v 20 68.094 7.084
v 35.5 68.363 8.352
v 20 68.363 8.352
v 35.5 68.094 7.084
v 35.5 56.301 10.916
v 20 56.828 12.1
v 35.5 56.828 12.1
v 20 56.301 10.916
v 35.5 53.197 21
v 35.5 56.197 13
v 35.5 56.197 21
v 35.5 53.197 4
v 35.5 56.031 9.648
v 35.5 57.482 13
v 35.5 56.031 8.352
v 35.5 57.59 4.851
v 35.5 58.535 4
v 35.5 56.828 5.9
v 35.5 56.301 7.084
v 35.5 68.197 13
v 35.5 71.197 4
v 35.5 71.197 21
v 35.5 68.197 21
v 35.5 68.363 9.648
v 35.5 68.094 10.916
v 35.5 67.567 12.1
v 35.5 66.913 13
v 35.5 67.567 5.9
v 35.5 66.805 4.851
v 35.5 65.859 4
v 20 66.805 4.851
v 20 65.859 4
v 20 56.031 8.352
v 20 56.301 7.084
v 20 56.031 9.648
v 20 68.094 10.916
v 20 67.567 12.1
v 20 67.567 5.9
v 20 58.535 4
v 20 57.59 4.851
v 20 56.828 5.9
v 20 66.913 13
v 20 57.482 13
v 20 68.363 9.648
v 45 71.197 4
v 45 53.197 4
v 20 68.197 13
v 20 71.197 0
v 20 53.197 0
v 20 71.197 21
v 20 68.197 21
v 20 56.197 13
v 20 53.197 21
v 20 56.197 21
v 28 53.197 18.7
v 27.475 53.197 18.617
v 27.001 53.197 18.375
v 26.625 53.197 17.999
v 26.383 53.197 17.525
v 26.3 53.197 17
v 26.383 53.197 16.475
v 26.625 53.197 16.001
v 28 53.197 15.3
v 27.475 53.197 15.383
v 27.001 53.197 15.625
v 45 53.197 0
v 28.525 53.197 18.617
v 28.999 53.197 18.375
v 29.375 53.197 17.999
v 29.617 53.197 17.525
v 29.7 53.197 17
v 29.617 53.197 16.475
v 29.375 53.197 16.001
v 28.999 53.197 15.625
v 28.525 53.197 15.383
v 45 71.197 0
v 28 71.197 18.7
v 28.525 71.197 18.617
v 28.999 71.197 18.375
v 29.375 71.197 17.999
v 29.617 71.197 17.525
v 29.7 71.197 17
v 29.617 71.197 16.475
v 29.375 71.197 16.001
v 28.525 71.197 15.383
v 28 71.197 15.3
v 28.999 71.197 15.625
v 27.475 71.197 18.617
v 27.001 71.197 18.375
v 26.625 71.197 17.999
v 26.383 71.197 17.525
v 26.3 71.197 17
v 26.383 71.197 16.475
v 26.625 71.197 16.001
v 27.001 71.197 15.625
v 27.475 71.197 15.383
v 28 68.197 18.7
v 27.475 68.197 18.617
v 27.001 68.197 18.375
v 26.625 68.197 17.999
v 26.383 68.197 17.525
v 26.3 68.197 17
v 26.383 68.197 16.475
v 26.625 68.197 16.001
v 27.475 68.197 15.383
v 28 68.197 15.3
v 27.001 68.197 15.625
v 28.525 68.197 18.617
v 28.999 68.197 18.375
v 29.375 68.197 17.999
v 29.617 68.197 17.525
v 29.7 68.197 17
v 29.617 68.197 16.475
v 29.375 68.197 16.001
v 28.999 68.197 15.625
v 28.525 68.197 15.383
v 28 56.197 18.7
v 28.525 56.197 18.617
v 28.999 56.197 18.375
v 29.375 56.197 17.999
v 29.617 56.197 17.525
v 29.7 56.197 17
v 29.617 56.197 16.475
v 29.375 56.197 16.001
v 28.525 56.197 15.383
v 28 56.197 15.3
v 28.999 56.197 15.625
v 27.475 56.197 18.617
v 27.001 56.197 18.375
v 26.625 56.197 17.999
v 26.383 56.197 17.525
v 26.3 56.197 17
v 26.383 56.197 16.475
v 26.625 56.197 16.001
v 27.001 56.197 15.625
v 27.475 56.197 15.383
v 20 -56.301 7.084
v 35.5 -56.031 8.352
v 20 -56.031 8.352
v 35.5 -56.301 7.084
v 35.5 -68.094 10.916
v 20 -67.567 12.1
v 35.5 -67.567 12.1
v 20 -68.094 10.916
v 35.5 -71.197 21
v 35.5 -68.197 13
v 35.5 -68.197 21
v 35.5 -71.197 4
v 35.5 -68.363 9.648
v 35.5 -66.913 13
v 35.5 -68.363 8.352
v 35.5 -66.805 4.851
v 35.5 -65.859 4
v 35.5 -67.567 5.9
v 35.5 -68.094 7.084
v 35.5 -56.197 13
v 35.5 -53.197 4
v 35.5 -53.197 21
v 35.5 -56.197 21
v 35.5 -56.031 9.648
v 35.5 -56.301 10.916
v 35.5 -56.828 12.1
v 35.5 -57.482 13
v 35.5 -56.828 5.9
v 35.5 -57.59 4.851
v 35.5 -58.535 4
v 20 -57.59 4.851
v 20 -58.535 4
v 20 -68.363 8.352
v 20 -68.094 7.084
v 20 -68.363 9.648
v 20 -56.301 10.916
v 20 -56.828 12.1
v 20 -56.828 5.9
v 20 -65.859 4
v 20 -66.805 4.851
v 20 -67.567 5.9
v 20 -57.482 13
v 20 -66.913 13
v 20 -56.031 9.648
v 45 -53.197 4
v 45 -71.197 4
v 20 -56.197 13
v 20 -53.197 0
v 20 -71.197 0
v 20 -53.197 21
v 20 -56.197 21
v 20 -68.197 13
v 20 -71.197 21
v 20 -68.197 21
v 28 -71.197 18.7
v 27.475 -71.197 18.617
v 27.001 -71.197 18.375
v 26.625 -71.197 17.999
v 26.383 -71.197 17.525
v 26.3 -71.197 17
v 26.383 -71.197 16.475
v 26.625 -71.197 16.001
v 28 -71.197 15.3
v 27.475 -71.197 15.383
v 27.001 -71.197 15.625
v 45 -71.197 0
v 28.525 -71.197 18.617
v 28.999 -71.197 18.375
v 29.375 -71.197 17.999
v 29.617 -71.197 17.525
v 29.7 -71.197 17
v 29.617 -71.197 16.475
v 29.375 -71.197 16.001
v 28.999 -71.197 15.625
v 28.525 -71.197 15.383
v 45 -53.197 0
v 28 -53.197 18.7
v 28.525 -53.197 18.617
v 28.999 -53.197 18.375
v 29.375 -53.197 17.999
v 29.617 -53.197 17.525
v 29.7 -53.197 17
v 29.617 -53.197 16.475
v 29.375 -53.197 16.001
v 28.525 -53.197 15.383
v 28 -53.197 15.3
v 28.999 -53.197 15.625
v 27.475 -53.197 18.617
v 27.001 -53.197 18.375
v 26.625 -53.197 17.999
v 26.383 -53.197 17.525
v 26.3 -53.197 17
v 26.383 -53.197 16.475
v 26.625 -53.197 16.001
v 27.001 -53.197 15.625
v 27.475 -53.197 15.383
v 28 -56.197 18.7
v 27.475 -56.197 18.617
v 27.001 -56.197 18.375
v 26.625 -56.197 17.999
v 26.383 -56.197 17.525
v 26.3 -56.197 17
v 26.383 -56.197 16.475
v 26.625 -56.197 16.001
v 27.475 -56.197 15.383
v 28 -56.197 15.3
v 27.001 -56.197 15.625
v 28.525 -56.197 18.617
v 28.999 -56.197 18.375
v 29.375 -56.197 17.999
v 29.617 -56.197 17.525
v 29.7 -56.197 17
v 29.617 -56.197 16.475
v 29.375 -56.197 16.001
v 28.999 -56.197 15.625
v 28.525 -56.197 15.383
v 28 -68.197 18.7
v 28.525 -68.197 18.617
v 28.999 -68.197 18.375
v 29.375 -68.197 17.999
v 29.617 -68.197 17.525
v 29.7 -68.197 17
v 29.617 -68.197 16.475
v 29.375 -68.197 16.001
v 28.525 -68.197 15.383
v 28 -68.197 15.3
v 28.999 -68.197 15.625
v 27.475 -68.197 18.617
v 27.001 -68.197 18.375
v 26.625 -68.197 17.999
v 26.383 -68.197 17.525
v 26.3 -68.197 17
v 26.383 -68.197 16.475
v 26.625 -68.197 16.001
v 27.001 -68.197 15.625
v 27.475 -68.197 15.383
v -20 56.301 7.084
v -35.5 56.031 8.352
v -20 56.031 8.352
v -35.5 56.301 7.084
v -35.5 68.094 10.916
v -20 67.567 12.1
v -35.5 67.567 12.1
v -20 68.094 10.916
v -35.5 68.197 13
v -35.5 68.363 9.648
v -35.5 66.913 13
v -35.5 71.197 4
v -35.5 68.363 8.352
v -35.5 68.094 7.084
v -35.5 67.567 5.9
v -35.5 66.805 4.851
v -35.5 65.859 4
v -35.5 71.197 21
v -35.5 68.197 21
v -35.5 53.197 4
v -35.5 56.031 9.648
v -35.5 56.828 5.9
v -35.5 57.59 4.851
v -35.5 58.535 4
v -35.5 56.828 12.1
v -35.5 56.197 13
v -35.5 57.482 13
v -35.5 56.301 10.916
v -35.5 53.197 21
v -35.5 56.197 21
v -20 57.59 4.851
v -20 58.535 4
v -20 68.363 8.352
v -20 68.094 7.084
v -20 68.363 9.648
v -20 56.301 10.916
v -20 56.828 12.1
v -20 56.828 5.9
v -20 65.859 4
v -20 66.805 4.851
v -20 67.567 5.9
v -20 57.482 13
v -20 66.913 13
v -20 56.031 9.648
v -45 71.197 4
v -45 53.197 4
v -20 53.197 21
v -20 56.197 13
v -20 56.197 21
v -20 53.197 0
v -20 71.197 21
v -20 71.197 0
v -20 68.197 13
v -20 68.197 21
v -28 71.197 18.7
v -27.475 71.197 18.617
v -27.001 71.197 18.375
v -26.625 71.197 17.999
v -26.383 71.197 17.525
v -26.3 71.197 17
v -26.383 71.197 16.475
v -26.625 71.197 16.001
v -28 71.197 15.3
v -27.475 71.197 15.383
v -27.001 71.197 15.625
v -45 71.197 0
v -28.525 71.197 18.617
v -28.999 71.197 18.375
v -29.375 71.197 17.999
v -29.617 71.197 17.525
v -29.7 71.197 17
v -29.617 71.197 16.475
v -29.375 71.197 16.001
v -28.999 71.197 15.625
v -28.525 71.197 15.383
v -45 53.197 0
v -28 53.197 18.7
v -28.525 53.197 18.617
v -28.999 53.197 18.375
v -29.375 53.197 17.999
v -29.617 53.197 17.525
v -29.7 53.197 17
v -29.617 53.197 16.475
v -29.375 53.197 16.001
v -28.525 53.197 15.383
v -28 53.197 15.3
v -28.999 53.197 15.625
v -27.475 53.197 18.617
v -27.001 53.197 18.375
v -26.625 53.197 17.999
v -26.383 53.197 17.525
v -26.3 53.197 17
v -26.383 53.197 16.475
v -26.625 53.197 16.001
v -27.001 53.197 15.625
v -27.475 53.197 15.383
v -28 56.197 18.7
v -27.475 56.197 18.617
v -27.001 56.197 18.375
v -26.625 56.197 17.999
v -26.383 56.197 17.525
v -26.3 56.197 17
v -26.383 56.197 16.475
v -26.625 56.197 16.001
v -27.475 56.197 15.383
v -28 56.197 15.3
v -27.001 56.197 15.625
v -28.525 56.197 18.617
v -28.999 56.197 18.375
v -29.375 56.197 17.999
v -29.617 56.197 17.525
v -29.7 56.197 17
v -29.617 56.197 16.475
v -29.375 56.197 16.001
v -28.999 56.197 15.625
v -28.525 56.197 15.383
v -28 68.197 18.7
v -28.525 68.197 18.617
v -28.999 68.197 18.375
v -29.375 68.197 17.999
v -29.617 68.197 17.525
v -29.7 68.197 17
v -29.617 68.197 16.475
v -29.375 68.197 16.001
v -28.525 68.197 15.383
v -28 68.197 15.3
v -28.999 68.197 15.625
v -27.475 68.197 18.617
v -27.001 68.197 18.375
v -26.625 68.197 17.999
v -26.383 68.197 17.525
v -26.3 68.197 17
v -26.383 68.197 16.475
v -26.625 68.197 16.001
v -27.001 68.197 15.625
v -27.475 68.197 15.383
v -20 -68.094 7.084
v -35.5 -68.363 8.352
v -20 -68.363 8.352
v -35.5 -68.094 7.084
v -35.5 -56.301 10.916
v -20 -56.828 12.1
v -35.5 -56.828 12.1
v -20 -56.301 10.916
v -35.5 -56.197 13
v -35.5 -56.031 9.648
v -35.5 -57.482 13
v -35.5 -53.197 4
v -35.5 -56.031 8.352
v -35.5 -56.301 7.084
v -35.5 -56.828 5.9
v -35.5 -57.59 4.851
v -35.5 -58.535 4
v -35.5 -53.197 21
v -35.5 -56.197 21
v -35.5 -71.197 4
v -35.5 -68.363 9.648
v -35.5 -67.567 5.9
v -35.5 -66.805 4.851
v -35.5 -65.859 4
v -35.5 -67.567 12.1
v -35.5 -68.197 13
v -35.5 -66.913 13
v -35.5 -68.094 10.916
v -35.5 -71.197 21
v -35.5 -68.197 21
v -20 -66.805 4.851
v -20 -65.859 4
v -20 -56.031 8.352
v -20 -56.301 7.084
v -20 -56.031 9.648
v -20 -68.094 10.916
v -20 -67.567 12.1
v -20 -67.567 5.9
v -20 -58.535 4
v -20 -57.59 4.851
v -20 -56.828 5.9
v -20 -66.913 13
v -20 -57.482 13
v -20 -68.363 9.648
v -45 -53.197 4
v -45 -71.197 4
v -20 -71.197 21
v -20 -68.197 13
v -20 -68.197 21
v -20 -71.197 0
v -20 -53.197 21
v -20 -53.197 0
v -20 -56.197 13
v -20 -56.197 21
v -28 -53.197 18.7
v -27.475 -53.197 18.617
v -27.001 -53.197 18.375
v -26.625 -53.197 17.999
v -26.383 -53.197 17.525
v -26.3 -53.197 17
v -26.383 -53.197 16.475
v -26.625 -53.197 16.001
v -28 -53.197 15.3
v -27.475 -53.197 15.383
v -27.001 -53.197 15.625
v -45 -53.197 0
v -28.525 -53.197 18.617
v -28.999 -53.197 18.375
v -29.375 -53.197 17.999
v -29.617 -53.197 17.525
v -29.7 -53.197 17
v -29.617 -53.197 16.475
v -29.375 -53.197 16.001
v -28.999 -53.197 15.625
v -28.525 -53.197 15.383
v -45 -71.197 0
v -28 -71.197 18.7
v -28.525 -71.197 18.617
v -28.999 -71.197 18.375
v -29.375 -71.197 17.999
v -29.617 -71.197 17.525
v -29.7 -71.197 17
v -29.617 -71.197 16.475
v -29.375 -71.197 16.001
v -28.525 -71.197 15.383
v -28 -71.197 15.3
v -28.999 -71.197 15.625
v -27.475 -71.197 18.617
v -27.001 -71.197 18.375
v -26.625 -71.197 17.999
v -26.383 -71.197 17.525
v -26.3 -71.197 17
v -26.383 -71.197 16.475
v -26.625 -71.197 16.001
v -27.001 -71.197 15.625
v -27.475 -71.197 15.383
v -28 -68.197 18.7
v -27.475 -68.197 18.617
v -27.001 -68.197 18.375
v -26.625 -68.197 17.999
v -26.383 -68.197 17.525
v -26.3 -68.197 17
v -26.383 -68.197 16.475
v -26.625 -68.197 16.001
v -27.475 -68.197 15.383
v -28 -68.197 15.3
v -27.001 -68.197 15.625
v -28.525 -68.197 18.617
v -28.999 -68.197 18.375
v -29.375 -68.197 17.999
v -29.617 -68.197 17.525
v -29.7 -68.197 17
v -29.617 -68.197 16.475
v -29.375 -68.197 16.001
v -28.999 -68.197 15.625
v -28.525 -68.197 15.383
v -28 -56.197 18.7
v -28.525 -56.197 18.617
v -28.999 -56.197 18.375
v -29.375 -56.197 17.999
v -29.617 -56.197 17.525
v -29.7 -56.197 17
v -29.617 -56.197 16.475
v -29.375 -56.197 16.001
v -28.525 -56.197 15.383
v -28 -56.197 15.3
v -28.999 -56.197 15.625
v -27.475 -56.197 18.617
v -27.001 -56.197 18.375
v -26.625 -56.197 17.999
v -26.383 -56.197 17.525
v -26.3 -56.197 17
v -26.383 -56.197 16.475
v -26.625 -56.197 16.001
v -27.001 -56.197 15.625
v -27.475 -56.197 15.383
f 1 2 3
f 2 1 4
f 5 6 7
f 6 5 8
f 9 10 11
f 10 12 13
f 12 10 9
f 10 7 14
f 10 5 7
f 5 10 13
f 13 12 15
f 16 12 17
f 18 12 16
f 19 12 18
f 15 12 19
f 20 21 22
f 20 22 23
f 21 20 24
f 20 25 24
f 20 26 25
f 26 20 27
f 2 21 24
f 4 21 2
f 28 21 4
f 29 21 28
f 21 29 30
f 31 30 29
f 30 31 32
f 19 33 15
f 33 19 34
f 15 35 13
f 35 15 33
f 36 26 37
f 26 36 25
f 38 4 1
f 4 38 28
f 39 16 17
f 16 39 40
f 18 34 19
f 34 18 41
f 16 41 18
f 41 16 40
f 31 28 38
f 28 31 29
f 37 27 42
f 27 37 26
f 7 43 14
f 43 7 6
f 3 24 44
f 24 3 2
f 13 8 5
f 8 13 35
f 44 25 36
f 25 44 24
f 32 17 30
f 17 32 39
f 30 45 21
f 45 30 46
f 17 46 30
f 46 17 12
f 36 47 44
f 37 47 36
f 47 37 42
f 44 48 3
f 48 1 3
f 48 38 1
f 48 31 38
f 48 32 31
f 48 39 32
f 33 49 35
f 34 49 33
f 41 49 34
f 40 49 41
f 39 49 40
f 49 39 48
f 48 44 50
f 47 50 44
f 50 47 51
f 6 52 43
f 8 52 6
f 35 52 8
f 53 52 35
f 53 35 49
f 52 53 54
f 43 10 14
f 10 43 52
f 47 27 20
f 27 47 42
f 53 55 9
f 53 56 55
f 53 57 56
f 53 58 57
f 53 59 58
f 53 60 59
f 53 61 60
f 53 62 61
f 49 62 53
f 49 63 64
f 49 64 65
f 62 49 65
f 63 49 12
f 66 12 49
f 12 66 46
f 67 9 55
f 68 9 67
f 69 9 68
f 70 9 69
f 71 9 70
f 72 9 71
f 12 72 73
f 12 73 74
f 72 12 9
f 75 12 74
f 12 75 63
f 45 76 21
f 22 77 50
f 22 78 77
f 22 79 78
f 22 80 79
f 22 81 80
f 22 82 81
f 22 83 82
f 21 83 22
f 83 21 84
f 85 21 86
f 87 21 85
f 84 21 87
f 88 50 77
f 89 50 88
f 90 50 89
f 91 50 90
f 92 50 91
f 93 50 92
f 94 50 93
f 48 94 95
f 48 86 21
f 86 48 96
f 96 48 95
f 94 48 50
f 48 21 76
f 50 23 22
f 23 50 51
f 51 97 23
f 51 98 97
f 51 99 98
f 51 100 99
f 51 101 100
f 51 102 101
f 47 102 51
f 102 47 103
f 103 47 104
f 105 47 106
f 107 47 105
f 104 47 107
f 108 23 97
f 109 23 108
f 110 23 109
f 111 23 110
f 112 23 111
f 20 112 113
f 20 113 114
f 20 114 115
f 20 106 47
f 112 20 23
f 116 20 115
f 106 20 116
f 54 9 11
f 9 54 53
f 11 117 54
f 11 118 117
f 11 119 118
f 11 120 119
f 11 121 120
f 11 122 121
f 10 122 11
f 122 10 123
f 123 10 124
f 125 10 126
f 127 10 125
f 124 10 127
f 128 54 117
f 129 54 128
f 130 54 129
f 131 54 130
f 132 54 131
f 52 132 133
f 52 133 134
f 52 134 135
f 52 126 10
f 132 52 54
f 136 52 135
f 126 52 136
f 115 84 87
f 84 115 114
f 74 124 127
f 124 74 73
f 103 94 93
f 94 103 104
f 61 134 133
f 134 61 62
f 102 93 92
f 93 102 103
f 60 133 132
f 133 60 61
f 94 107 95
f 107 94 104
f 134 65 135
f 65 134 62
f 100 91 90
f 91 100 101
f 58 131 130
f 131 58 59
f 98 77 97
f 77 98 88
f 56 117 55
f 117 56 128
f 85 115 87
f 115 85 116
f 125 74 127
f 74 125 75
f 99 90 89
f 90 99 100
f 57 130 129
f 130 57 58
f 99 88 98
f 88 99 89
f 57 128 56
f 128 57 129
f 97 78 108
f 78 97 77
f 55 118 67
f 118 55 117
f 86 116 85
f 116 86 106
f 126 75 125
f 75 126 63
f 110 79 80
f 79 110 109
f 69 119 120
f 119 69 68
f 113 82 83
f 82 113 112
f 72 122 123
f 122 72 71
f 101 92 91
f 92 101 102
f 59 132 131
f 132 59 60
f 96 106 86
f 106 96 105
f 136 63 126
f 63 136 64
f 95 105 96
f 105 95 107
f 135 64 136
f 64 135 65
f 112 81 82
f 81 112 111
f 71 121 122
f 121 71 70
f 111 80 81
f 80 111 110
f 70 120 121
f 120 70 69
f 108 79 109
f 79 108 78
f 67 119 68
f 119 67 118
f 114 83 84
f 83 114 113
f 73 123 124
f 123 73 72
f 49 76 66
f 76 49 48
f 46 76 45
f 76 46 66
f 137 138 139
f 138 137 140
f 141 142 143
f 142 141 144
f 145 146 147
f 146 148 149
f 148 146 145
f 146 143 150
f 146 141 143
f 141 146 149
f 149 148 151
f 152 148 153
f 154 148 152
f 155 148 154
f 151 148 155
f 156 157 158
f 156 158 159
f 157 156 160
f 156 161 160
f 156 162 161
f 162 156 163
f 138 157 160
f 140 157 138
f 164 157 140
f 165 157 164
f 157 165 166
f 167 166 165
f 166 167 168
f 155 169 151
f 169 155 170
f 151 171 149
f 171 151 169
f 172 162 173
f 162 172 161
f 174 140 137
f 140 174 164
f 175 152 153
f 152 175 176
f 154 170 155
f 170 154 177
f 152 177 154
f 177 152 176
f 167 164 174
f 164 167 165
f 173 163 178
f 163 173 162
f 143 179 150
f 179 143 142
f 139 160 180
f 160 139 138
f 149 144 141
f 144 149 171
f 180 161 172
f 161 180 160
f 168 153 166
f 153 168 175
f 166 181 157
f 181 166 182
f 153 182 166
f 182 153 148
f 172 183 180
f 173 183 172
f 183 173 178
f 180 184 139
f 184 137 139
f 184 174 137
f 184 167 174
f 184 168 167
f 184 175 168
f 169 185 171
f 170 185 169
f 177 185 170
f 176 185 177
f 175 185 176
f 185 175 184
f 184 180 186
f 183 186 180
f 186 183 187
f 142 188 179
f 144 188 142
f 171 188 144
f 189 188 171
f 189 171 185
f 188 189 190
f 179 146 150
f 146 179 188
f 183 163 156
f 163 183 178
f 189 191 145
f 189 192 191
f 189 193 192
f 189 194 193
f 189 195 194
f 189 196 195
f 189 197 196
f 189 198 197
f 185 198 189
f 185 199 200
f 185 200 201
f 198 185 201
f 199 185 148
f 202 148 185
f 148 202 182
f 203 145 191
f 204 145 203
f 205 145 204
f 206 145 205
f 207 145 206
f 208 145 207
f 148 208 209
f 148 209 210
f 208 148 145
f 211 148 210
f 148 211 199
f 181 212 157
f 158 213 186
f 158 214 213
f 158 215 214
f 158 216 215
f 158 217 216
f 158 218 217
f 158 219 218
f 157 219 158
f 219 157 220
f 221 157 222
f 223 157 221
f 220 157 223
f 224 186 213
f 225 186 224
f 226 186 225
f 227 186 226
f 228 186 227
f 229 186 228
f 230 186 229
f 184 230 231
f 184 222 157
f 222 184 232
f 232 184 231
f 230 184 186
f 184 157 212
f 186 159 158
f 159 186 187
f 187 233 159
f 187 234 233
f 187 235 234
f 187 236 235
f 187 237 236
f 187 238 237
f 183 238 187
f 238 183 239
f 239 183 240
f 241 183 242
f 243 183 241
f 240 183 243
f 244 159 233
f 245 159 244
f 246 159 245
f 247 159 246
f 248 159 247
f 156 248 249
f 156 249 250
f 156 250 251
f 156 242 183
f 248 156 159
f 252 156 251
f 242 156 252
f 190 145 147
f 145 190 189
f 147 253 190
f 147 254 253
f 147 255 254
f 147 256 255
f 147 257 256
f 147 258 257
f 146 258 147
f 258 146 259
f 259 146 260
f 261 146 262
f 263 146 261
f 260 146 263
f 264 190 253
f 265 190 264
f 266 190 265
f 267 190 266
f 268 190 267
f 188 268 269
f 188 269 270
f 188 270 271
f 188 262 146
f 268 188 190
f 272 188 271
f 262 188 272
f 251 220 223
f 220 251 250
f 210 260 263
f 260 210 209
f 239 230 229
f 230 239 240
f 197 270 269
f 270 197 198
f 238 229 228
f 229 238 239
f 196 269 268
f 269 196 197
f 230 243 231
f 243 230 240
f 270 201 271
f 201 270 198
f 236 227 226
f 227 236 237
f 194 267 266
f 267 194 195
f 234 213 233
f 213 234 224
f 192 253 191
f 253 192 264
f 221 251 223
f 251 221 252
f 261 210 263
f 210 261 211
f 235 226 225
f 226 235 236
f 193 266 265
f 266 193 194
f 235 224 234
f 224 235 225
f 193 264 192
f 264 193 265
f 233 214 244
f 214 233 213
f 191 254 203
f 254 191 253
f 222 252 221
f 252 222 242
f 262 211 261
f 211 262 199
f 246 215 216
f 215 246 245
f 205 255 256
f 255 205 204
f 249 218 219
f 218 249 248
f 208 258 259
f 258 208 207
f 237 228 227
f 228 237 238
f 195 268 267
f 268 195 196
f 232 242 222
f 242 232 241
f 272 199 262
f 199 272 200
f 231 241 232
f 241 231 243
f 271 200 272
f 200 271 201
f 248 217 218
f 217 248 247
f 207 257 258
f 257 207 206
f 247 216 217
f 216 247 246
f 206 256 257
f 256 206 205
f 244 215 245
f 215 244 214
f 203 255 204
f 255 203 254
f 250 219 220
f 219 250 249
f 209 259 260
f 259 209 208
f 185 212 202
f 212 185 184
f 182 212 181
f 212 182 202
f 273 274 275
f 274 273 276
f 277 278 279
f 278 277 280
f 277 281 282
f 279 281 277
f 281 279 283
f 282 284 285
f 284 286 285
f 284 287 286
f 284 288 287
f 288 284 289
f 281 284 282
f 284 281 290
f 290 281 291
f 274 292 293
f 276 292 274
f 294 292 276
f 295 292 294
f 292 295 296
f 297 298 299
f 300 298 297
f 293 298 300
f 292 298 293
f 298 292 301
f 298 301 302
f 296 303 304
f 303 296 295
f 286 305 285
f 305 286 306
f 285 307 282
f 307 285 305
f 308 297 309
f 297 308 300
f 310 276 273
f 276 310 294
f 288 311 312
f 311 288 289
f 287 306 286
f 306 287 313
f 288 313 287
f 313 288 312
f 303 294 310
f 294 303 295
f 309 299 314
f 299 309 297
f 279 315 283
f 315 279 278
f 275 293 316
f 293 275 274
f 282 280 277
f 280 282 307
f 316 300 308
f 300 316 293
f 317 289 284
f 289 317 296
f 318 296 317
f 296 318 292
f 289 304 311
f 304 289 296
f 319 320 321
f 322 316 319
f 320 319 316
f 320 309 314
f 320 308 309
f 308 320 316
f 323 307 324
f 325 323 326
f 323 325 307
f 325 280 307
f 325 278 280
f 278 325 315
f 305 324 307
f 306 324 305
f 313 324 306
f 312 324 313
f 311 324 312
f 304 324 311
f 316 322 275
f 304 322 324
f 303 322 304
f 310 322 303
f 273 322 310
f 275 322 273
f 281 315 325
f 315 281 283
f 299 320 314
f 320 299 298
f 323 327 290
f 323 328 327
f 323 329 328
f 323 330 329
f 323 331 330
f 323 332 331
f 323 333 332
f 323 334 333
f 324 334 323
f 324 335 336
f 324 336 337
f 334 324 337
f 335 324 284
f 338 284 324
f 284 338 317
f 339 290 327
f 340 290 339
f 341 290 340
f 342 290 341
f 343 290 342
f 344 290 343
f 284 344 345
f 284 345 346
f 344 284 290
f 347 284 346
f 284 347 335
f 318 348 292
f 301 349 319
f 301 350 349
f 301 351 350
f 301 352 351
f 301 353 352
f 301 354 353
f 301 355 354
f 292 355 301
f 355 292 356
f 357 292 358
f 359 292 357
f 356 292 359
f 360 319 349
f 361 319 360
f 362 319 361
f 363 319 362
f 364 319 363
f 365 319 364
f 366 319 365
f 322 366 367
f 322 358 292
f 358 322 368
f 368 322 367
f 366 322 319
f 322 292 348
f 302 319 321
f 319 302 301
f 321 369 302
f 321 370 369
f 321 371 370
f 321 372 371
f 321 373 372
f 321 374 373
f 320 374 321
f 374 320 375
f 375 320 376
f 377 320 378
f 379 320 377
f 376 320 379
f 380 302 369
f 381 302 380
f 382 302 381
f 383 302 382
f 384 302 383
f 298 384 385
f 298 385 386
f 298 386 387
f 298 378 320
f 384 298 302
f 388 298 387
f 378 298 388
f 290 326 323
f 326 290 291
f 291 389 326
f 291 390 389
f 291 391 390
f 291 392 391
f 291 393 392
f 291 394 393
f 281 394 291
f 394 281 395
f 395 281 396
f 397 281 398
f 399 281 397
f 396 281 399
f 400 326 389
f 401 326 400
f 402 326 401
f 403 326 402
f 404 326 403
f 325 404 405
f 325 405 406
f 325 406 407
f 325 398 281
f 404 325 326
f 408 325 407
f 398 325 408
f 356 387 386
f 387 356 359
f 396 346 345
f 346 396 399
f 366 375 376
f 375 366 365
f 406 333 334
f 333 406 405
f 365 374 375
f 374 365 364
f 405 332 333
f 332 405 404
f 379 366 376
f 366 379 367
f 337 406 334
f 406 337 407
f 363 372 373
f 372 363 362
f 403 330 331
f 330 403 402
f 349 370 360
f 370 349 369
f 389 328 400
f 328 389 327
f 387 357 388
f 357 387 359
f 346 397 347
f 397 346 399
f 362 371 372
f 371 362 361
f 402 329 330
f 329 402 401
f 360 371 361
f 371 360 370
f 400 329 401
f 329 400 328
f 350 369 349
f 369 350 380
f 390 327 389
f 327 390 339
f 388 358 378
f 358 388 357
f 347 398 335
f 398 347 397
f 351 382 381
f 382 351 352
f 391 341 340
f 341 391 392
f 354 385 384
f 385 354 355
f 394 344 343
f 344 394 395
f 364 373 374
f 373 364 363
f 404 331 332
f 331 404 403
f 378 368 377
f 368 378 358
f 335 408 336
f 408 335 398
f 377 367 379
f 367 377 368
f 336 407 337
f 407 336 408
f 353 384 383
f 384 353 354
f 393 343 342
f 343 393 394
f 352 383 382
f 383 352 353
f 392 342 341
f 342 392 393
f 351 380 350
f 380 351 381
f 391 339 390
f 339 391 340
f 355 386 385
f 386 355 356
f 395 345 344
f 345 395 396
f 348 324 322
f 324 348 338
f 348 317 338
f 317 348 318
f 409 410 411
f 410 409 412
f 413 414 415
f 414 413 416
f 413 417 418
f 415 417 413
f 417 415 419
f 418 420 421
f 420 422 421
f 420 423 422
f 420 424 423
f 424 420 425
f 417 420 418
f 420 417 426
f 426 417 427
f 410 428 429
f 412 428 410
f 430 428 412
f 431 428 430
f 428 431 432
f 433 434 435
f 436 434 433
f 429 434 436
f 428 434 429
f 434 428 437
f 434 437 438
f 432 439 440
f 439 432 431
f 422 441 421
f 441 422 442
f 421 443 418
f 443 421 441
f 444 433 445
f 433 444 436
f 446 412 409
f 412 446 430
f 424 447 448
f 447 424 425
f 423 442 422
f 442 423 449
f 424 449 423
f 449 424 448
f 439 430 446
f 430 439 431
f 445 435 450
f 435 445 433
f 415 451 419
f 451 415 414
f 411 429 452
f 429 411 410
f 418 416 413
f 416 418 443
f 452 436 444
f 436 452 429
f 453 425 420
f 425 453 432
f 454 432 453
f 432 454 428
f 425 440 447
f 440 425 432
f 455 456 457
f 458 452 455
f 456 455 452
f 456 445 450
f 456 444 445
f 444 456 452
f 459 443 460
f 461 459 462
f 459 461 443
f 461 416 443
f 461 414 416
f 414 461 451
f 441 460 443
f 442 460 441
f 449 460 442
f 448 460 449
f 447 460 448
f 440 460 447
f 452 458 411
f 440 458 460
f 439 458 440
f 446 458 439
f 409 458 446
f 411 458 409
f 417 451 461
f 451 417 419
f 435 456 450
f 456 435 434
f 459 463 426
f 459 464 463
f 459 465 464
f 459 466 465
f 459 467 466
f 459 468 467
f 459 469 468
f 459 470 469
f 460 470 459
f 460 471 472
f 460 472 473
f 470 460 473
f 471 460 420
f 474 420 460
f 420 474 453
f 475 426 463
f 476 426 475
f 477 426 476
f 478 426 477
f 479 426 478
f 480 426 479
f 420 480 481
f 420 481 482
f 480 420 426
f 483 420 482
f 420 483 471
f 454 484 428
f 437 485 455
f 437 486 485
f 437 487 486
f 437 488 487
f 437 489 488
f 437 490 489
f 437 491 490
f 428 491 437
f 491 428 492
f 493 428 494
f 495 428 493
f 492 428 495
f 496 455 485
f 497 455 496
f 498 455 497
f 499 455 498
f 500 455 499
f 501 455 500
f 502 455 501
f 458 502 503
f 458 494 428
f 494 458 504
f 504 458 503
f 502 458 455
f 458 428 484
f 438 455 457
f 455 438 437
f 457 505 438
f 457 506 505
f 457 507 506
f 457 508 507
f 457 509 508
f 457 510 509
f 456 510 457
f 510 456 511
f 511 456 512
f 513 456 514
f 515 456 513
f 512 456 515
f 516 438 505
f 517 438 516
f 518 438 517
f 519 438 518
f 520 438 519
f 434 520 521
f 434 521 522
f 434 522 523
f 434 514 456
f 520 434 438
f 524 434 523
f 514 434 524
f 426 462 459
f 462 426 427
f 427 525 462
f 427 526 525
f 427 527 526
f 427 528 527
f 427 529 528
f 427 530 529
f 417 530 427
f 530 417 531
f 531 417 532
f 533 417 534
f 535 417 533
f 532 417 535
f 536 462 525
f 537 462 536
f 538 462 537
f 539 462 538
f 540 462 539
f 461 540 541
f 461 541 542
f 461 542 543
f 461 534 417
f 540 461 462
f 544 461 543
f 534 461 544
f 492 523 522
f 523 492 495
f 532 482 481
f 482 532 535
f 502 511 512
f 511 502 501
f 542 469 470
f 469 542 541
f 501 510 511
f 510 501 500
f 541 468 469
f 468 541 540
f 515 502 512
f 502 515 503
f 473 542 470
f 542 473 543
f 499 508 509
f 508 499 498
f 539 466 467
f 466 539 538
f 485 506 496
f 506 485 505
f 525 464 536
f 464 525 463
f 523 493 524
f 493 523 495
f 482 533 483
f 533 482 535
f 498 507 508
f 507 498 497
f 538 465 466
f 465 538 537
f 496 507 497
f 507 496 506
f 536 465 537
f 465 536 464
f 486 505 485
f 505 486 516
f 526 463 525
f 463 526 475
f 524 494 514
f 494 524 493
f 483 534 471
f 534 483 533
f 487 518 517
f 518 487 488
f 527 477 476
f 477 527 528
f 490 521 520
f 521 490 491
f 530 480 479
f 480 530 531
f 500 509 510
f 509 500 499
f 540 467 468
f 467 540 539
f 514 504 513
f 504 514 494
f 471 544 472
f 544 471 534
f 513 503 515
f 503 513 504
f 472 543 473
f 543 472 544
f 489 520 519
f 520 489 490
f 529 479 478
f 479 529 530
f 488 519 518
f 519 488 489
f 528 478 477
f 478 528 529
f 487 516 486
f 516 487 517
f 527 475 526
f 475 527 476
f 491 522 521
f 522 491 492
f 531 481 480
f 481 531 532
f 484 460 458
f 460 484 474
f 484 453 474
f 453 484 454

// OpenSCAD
slop = 0.01;

ps = 0.1 * 25.4;

frame_w = 90;

hub_motor_distance = 12;
wheel_attachment_thickness = 10.3945;
wheel_distance = hub_motor_distance + wheel_attachment_thickness/2; // Distance of center of wheel from base of motor shaft.


frame_thickness = 4;

module screw_hole_6_32() {
  translate([0.5 * ps, 0.5 * ps])
  difference() {
    circle(r = 10/2, $fn = 20);
    circle(r = 4.4/2, $fn = 16);
  }
}


module motor_preview() {
  // Keyed shaft
  color([0.7, 0.7, 0.7, 0.7])
  %intersection() {
    cylinder(r = 1.5, h = 9, $fn = 10);
    translate([-1.5, -1.5, 0]) cube([3, 2.5, 9]);
  }

  // Gear box
  color([0.7, 0.7, 0.2, 0.7])
  translate([-6, -5, -9.5]) %cube([12, 10, 9.5]);
    
  // Motor body
  color([0.7, 0.7, 0.7, 0.7])
  translate([0, 0, -24.5])
  %intersection() {
    cylinder(r = 6, h = 15, $fn = 20);
    translate([-6, -5, 0]) cube([12, 10, 15]);
  }
}

module battery_preview() {
  translate([0, 0, 8])
  %cube([30, 93, 16], center=true);
}


holder_bracket_thickness = 3;
screw_4_40_r = 1.7;
screw_4_40_but_r = 3.9;
screw_4_40_washer_r = 4.0;


module motor_holder() {
  translate([0, -6 - holder_bracket_thickness, 0])
  cube([25, 12 + 2*holder_bracket_thickness, frame_thickness]);

  translate([9.5, -6 - holder_bracket_thickness, frame_thickness])
  difference() {
    cube([15.5, 12 + 2*holder_bracket_thickness, 9]);
    intersection() {
      translate([0, 6 + holder_bracket_thickness, 5]) rotate([0, 90, 0]) cylinder(r = 6.2, h = 16, $fn = 30);
      translate([0, holder_bracket_thickness-.2, 0]) cube([16, 12.4, 10]);
    }
  }
  
  difference() {
    union() {
      translate([9.5, -6 - holder_bracket_thickness, frame_thickness + 9])
      cube([15.5, holder_bracket_thickness, 8]);
      
      translate([9.5, 6, frame_thickness + 9])
      cube([15.5, holder_bracket_thickness, 8]);
    }
    
    translate([9.5 + 15/2, -12.5, 13 + frame_thickness]) rotate([-90, 0, 0]) cylinder(r = screw_4_40_r, h = 25, $fn = 20);
  }
  
  %translate([9.5 + 15/2, -12.5, 13 + frame_thickness]) rotate([-90, 0, 0]) cylinder(r = screw_4_40_r, h = 25, $fn = 12);
  //4-40 screw preview
  
  translate([0, 0, 5 + frame_thickness])
  rotate([90, 0, -90])
  motor_preview();
}



translate([0, 0, -5])
%square([frame_w + 2*wheel_distance, frame_w + 2*wheel_distance], center = true);

translate([0, 0, frame_thickness+slop])
color([1, .3, 0, 0.5]) battery_preview();

main_strut_w = 12;
minor_strut_w = 4;

minor_strut_x_count = 2;
minor_strut_y_count = 4;

inner_x = frame_w - main_strut_w*2 + minor_strut_w;
inner_y = frame_w + 2*wheel_distance + 2*6 + 2*holder_bracket_thickness - main_strut_w*2 + minor_strut_w;


electronics_holder_x = 0;
electronics_holder_y = -5;

module body_frame() {
  translate([frame_w/2, frame_w/2 + wheel_distance, 0])
  rotate([0, 0, 180])
  motor_holder();
  
  translate([frame_w/2, -frame_w/2 - wheel_distance, 0])
  rotate([0, 0, 180])
  motor_holder();
  
  translate([-frame_w/2, frame_w/2 + wheel_distance, 0])
  motor_holder();
  
  translate([-frame_w/2, -frame_w/2 - wheel_distance, 0])
  motor_holder();
  
  
  //%square([inner_x, inner_y], center = true);
  
  //linear_extrude(height = frame_thickness, convexity = 20)
  difference() {
    union() {
      translate([-frame_w/2, -frame_w/2 - wheel_distance - 6 - holder_bracket_thickness])
      square([main_strut_w, frame_w + 2*wheel_distance + 12 + 2*holder_bracket_thickness]);
    
      translate([-frame_w/2, -frame_w/2 - wheel_distance - 6 - holder_bracket_thickness])
      square([frame_w, main_strut_w]);
    
      translate([frame_w/2 - main_strut_w, -frame_w/2 - wheel_distance - 6 - holder_bracket_thickness])
      square([main_strut_w, frame_w + 2*wheel_distance + 12 + 2*holder_bracket_thickness]);
    
      translate([-frame_w/2, frame_w/2 + wheel_distance + 6 + holder_bracket_thickness - main_strut_w])
      square([frame_w, main_strut_w]);
      
      for(dx = [1: 1: minor_strut_x_count]) {
        translate([-inner_x/2 + (dx/(minor_strut_x_count+1)) * inner_x - minor_strut_w/2, -inner_y/2 - slop ])
        square([minor_strut_w, inner_y + 2*slop]);
      }
    
      for(dy = [1: 1: minor_strut_y_count]) {
        translate([-inner_x/2 - slop, -inner_y/2 + (dy/(minor_strut_y_count+1)) * inner_y - minor_strut_w/2])
        square([inner_x + 2*slop, minor_strut_w]);
      }

      translate([electronics_holder_x, electronics_holder_y]) {
        translate([14*ps, 7*ps]) screw_hole_6_32();
        translate([-15*ps, 7*ps]) screw_hole_6_32();
      
        translate([14*ps, -16*ps]) screw_hole_6_32();
        translate([-15*ps, -16*ps]) screw_hole_6_32();
      }
    }
    translate([electronics_holder_x, electronics_holder_y]) {
      translate([14.5*ps, 7.5*ps]) circle(r = 4.4/2, $fn = 16);
      translate([-14.5*ps, 7.5*ps]) circle(r = 4.4/2, $fn = 16);
      translate([14.5*ps, -15.5*ps]) circle(r = 4.4/2, $fn = 16);
      translate([-14.5*ps, -15.5*ps]) circle(r = 4.4/2, $fn = 16);
    }
  }
}


body_frame();
